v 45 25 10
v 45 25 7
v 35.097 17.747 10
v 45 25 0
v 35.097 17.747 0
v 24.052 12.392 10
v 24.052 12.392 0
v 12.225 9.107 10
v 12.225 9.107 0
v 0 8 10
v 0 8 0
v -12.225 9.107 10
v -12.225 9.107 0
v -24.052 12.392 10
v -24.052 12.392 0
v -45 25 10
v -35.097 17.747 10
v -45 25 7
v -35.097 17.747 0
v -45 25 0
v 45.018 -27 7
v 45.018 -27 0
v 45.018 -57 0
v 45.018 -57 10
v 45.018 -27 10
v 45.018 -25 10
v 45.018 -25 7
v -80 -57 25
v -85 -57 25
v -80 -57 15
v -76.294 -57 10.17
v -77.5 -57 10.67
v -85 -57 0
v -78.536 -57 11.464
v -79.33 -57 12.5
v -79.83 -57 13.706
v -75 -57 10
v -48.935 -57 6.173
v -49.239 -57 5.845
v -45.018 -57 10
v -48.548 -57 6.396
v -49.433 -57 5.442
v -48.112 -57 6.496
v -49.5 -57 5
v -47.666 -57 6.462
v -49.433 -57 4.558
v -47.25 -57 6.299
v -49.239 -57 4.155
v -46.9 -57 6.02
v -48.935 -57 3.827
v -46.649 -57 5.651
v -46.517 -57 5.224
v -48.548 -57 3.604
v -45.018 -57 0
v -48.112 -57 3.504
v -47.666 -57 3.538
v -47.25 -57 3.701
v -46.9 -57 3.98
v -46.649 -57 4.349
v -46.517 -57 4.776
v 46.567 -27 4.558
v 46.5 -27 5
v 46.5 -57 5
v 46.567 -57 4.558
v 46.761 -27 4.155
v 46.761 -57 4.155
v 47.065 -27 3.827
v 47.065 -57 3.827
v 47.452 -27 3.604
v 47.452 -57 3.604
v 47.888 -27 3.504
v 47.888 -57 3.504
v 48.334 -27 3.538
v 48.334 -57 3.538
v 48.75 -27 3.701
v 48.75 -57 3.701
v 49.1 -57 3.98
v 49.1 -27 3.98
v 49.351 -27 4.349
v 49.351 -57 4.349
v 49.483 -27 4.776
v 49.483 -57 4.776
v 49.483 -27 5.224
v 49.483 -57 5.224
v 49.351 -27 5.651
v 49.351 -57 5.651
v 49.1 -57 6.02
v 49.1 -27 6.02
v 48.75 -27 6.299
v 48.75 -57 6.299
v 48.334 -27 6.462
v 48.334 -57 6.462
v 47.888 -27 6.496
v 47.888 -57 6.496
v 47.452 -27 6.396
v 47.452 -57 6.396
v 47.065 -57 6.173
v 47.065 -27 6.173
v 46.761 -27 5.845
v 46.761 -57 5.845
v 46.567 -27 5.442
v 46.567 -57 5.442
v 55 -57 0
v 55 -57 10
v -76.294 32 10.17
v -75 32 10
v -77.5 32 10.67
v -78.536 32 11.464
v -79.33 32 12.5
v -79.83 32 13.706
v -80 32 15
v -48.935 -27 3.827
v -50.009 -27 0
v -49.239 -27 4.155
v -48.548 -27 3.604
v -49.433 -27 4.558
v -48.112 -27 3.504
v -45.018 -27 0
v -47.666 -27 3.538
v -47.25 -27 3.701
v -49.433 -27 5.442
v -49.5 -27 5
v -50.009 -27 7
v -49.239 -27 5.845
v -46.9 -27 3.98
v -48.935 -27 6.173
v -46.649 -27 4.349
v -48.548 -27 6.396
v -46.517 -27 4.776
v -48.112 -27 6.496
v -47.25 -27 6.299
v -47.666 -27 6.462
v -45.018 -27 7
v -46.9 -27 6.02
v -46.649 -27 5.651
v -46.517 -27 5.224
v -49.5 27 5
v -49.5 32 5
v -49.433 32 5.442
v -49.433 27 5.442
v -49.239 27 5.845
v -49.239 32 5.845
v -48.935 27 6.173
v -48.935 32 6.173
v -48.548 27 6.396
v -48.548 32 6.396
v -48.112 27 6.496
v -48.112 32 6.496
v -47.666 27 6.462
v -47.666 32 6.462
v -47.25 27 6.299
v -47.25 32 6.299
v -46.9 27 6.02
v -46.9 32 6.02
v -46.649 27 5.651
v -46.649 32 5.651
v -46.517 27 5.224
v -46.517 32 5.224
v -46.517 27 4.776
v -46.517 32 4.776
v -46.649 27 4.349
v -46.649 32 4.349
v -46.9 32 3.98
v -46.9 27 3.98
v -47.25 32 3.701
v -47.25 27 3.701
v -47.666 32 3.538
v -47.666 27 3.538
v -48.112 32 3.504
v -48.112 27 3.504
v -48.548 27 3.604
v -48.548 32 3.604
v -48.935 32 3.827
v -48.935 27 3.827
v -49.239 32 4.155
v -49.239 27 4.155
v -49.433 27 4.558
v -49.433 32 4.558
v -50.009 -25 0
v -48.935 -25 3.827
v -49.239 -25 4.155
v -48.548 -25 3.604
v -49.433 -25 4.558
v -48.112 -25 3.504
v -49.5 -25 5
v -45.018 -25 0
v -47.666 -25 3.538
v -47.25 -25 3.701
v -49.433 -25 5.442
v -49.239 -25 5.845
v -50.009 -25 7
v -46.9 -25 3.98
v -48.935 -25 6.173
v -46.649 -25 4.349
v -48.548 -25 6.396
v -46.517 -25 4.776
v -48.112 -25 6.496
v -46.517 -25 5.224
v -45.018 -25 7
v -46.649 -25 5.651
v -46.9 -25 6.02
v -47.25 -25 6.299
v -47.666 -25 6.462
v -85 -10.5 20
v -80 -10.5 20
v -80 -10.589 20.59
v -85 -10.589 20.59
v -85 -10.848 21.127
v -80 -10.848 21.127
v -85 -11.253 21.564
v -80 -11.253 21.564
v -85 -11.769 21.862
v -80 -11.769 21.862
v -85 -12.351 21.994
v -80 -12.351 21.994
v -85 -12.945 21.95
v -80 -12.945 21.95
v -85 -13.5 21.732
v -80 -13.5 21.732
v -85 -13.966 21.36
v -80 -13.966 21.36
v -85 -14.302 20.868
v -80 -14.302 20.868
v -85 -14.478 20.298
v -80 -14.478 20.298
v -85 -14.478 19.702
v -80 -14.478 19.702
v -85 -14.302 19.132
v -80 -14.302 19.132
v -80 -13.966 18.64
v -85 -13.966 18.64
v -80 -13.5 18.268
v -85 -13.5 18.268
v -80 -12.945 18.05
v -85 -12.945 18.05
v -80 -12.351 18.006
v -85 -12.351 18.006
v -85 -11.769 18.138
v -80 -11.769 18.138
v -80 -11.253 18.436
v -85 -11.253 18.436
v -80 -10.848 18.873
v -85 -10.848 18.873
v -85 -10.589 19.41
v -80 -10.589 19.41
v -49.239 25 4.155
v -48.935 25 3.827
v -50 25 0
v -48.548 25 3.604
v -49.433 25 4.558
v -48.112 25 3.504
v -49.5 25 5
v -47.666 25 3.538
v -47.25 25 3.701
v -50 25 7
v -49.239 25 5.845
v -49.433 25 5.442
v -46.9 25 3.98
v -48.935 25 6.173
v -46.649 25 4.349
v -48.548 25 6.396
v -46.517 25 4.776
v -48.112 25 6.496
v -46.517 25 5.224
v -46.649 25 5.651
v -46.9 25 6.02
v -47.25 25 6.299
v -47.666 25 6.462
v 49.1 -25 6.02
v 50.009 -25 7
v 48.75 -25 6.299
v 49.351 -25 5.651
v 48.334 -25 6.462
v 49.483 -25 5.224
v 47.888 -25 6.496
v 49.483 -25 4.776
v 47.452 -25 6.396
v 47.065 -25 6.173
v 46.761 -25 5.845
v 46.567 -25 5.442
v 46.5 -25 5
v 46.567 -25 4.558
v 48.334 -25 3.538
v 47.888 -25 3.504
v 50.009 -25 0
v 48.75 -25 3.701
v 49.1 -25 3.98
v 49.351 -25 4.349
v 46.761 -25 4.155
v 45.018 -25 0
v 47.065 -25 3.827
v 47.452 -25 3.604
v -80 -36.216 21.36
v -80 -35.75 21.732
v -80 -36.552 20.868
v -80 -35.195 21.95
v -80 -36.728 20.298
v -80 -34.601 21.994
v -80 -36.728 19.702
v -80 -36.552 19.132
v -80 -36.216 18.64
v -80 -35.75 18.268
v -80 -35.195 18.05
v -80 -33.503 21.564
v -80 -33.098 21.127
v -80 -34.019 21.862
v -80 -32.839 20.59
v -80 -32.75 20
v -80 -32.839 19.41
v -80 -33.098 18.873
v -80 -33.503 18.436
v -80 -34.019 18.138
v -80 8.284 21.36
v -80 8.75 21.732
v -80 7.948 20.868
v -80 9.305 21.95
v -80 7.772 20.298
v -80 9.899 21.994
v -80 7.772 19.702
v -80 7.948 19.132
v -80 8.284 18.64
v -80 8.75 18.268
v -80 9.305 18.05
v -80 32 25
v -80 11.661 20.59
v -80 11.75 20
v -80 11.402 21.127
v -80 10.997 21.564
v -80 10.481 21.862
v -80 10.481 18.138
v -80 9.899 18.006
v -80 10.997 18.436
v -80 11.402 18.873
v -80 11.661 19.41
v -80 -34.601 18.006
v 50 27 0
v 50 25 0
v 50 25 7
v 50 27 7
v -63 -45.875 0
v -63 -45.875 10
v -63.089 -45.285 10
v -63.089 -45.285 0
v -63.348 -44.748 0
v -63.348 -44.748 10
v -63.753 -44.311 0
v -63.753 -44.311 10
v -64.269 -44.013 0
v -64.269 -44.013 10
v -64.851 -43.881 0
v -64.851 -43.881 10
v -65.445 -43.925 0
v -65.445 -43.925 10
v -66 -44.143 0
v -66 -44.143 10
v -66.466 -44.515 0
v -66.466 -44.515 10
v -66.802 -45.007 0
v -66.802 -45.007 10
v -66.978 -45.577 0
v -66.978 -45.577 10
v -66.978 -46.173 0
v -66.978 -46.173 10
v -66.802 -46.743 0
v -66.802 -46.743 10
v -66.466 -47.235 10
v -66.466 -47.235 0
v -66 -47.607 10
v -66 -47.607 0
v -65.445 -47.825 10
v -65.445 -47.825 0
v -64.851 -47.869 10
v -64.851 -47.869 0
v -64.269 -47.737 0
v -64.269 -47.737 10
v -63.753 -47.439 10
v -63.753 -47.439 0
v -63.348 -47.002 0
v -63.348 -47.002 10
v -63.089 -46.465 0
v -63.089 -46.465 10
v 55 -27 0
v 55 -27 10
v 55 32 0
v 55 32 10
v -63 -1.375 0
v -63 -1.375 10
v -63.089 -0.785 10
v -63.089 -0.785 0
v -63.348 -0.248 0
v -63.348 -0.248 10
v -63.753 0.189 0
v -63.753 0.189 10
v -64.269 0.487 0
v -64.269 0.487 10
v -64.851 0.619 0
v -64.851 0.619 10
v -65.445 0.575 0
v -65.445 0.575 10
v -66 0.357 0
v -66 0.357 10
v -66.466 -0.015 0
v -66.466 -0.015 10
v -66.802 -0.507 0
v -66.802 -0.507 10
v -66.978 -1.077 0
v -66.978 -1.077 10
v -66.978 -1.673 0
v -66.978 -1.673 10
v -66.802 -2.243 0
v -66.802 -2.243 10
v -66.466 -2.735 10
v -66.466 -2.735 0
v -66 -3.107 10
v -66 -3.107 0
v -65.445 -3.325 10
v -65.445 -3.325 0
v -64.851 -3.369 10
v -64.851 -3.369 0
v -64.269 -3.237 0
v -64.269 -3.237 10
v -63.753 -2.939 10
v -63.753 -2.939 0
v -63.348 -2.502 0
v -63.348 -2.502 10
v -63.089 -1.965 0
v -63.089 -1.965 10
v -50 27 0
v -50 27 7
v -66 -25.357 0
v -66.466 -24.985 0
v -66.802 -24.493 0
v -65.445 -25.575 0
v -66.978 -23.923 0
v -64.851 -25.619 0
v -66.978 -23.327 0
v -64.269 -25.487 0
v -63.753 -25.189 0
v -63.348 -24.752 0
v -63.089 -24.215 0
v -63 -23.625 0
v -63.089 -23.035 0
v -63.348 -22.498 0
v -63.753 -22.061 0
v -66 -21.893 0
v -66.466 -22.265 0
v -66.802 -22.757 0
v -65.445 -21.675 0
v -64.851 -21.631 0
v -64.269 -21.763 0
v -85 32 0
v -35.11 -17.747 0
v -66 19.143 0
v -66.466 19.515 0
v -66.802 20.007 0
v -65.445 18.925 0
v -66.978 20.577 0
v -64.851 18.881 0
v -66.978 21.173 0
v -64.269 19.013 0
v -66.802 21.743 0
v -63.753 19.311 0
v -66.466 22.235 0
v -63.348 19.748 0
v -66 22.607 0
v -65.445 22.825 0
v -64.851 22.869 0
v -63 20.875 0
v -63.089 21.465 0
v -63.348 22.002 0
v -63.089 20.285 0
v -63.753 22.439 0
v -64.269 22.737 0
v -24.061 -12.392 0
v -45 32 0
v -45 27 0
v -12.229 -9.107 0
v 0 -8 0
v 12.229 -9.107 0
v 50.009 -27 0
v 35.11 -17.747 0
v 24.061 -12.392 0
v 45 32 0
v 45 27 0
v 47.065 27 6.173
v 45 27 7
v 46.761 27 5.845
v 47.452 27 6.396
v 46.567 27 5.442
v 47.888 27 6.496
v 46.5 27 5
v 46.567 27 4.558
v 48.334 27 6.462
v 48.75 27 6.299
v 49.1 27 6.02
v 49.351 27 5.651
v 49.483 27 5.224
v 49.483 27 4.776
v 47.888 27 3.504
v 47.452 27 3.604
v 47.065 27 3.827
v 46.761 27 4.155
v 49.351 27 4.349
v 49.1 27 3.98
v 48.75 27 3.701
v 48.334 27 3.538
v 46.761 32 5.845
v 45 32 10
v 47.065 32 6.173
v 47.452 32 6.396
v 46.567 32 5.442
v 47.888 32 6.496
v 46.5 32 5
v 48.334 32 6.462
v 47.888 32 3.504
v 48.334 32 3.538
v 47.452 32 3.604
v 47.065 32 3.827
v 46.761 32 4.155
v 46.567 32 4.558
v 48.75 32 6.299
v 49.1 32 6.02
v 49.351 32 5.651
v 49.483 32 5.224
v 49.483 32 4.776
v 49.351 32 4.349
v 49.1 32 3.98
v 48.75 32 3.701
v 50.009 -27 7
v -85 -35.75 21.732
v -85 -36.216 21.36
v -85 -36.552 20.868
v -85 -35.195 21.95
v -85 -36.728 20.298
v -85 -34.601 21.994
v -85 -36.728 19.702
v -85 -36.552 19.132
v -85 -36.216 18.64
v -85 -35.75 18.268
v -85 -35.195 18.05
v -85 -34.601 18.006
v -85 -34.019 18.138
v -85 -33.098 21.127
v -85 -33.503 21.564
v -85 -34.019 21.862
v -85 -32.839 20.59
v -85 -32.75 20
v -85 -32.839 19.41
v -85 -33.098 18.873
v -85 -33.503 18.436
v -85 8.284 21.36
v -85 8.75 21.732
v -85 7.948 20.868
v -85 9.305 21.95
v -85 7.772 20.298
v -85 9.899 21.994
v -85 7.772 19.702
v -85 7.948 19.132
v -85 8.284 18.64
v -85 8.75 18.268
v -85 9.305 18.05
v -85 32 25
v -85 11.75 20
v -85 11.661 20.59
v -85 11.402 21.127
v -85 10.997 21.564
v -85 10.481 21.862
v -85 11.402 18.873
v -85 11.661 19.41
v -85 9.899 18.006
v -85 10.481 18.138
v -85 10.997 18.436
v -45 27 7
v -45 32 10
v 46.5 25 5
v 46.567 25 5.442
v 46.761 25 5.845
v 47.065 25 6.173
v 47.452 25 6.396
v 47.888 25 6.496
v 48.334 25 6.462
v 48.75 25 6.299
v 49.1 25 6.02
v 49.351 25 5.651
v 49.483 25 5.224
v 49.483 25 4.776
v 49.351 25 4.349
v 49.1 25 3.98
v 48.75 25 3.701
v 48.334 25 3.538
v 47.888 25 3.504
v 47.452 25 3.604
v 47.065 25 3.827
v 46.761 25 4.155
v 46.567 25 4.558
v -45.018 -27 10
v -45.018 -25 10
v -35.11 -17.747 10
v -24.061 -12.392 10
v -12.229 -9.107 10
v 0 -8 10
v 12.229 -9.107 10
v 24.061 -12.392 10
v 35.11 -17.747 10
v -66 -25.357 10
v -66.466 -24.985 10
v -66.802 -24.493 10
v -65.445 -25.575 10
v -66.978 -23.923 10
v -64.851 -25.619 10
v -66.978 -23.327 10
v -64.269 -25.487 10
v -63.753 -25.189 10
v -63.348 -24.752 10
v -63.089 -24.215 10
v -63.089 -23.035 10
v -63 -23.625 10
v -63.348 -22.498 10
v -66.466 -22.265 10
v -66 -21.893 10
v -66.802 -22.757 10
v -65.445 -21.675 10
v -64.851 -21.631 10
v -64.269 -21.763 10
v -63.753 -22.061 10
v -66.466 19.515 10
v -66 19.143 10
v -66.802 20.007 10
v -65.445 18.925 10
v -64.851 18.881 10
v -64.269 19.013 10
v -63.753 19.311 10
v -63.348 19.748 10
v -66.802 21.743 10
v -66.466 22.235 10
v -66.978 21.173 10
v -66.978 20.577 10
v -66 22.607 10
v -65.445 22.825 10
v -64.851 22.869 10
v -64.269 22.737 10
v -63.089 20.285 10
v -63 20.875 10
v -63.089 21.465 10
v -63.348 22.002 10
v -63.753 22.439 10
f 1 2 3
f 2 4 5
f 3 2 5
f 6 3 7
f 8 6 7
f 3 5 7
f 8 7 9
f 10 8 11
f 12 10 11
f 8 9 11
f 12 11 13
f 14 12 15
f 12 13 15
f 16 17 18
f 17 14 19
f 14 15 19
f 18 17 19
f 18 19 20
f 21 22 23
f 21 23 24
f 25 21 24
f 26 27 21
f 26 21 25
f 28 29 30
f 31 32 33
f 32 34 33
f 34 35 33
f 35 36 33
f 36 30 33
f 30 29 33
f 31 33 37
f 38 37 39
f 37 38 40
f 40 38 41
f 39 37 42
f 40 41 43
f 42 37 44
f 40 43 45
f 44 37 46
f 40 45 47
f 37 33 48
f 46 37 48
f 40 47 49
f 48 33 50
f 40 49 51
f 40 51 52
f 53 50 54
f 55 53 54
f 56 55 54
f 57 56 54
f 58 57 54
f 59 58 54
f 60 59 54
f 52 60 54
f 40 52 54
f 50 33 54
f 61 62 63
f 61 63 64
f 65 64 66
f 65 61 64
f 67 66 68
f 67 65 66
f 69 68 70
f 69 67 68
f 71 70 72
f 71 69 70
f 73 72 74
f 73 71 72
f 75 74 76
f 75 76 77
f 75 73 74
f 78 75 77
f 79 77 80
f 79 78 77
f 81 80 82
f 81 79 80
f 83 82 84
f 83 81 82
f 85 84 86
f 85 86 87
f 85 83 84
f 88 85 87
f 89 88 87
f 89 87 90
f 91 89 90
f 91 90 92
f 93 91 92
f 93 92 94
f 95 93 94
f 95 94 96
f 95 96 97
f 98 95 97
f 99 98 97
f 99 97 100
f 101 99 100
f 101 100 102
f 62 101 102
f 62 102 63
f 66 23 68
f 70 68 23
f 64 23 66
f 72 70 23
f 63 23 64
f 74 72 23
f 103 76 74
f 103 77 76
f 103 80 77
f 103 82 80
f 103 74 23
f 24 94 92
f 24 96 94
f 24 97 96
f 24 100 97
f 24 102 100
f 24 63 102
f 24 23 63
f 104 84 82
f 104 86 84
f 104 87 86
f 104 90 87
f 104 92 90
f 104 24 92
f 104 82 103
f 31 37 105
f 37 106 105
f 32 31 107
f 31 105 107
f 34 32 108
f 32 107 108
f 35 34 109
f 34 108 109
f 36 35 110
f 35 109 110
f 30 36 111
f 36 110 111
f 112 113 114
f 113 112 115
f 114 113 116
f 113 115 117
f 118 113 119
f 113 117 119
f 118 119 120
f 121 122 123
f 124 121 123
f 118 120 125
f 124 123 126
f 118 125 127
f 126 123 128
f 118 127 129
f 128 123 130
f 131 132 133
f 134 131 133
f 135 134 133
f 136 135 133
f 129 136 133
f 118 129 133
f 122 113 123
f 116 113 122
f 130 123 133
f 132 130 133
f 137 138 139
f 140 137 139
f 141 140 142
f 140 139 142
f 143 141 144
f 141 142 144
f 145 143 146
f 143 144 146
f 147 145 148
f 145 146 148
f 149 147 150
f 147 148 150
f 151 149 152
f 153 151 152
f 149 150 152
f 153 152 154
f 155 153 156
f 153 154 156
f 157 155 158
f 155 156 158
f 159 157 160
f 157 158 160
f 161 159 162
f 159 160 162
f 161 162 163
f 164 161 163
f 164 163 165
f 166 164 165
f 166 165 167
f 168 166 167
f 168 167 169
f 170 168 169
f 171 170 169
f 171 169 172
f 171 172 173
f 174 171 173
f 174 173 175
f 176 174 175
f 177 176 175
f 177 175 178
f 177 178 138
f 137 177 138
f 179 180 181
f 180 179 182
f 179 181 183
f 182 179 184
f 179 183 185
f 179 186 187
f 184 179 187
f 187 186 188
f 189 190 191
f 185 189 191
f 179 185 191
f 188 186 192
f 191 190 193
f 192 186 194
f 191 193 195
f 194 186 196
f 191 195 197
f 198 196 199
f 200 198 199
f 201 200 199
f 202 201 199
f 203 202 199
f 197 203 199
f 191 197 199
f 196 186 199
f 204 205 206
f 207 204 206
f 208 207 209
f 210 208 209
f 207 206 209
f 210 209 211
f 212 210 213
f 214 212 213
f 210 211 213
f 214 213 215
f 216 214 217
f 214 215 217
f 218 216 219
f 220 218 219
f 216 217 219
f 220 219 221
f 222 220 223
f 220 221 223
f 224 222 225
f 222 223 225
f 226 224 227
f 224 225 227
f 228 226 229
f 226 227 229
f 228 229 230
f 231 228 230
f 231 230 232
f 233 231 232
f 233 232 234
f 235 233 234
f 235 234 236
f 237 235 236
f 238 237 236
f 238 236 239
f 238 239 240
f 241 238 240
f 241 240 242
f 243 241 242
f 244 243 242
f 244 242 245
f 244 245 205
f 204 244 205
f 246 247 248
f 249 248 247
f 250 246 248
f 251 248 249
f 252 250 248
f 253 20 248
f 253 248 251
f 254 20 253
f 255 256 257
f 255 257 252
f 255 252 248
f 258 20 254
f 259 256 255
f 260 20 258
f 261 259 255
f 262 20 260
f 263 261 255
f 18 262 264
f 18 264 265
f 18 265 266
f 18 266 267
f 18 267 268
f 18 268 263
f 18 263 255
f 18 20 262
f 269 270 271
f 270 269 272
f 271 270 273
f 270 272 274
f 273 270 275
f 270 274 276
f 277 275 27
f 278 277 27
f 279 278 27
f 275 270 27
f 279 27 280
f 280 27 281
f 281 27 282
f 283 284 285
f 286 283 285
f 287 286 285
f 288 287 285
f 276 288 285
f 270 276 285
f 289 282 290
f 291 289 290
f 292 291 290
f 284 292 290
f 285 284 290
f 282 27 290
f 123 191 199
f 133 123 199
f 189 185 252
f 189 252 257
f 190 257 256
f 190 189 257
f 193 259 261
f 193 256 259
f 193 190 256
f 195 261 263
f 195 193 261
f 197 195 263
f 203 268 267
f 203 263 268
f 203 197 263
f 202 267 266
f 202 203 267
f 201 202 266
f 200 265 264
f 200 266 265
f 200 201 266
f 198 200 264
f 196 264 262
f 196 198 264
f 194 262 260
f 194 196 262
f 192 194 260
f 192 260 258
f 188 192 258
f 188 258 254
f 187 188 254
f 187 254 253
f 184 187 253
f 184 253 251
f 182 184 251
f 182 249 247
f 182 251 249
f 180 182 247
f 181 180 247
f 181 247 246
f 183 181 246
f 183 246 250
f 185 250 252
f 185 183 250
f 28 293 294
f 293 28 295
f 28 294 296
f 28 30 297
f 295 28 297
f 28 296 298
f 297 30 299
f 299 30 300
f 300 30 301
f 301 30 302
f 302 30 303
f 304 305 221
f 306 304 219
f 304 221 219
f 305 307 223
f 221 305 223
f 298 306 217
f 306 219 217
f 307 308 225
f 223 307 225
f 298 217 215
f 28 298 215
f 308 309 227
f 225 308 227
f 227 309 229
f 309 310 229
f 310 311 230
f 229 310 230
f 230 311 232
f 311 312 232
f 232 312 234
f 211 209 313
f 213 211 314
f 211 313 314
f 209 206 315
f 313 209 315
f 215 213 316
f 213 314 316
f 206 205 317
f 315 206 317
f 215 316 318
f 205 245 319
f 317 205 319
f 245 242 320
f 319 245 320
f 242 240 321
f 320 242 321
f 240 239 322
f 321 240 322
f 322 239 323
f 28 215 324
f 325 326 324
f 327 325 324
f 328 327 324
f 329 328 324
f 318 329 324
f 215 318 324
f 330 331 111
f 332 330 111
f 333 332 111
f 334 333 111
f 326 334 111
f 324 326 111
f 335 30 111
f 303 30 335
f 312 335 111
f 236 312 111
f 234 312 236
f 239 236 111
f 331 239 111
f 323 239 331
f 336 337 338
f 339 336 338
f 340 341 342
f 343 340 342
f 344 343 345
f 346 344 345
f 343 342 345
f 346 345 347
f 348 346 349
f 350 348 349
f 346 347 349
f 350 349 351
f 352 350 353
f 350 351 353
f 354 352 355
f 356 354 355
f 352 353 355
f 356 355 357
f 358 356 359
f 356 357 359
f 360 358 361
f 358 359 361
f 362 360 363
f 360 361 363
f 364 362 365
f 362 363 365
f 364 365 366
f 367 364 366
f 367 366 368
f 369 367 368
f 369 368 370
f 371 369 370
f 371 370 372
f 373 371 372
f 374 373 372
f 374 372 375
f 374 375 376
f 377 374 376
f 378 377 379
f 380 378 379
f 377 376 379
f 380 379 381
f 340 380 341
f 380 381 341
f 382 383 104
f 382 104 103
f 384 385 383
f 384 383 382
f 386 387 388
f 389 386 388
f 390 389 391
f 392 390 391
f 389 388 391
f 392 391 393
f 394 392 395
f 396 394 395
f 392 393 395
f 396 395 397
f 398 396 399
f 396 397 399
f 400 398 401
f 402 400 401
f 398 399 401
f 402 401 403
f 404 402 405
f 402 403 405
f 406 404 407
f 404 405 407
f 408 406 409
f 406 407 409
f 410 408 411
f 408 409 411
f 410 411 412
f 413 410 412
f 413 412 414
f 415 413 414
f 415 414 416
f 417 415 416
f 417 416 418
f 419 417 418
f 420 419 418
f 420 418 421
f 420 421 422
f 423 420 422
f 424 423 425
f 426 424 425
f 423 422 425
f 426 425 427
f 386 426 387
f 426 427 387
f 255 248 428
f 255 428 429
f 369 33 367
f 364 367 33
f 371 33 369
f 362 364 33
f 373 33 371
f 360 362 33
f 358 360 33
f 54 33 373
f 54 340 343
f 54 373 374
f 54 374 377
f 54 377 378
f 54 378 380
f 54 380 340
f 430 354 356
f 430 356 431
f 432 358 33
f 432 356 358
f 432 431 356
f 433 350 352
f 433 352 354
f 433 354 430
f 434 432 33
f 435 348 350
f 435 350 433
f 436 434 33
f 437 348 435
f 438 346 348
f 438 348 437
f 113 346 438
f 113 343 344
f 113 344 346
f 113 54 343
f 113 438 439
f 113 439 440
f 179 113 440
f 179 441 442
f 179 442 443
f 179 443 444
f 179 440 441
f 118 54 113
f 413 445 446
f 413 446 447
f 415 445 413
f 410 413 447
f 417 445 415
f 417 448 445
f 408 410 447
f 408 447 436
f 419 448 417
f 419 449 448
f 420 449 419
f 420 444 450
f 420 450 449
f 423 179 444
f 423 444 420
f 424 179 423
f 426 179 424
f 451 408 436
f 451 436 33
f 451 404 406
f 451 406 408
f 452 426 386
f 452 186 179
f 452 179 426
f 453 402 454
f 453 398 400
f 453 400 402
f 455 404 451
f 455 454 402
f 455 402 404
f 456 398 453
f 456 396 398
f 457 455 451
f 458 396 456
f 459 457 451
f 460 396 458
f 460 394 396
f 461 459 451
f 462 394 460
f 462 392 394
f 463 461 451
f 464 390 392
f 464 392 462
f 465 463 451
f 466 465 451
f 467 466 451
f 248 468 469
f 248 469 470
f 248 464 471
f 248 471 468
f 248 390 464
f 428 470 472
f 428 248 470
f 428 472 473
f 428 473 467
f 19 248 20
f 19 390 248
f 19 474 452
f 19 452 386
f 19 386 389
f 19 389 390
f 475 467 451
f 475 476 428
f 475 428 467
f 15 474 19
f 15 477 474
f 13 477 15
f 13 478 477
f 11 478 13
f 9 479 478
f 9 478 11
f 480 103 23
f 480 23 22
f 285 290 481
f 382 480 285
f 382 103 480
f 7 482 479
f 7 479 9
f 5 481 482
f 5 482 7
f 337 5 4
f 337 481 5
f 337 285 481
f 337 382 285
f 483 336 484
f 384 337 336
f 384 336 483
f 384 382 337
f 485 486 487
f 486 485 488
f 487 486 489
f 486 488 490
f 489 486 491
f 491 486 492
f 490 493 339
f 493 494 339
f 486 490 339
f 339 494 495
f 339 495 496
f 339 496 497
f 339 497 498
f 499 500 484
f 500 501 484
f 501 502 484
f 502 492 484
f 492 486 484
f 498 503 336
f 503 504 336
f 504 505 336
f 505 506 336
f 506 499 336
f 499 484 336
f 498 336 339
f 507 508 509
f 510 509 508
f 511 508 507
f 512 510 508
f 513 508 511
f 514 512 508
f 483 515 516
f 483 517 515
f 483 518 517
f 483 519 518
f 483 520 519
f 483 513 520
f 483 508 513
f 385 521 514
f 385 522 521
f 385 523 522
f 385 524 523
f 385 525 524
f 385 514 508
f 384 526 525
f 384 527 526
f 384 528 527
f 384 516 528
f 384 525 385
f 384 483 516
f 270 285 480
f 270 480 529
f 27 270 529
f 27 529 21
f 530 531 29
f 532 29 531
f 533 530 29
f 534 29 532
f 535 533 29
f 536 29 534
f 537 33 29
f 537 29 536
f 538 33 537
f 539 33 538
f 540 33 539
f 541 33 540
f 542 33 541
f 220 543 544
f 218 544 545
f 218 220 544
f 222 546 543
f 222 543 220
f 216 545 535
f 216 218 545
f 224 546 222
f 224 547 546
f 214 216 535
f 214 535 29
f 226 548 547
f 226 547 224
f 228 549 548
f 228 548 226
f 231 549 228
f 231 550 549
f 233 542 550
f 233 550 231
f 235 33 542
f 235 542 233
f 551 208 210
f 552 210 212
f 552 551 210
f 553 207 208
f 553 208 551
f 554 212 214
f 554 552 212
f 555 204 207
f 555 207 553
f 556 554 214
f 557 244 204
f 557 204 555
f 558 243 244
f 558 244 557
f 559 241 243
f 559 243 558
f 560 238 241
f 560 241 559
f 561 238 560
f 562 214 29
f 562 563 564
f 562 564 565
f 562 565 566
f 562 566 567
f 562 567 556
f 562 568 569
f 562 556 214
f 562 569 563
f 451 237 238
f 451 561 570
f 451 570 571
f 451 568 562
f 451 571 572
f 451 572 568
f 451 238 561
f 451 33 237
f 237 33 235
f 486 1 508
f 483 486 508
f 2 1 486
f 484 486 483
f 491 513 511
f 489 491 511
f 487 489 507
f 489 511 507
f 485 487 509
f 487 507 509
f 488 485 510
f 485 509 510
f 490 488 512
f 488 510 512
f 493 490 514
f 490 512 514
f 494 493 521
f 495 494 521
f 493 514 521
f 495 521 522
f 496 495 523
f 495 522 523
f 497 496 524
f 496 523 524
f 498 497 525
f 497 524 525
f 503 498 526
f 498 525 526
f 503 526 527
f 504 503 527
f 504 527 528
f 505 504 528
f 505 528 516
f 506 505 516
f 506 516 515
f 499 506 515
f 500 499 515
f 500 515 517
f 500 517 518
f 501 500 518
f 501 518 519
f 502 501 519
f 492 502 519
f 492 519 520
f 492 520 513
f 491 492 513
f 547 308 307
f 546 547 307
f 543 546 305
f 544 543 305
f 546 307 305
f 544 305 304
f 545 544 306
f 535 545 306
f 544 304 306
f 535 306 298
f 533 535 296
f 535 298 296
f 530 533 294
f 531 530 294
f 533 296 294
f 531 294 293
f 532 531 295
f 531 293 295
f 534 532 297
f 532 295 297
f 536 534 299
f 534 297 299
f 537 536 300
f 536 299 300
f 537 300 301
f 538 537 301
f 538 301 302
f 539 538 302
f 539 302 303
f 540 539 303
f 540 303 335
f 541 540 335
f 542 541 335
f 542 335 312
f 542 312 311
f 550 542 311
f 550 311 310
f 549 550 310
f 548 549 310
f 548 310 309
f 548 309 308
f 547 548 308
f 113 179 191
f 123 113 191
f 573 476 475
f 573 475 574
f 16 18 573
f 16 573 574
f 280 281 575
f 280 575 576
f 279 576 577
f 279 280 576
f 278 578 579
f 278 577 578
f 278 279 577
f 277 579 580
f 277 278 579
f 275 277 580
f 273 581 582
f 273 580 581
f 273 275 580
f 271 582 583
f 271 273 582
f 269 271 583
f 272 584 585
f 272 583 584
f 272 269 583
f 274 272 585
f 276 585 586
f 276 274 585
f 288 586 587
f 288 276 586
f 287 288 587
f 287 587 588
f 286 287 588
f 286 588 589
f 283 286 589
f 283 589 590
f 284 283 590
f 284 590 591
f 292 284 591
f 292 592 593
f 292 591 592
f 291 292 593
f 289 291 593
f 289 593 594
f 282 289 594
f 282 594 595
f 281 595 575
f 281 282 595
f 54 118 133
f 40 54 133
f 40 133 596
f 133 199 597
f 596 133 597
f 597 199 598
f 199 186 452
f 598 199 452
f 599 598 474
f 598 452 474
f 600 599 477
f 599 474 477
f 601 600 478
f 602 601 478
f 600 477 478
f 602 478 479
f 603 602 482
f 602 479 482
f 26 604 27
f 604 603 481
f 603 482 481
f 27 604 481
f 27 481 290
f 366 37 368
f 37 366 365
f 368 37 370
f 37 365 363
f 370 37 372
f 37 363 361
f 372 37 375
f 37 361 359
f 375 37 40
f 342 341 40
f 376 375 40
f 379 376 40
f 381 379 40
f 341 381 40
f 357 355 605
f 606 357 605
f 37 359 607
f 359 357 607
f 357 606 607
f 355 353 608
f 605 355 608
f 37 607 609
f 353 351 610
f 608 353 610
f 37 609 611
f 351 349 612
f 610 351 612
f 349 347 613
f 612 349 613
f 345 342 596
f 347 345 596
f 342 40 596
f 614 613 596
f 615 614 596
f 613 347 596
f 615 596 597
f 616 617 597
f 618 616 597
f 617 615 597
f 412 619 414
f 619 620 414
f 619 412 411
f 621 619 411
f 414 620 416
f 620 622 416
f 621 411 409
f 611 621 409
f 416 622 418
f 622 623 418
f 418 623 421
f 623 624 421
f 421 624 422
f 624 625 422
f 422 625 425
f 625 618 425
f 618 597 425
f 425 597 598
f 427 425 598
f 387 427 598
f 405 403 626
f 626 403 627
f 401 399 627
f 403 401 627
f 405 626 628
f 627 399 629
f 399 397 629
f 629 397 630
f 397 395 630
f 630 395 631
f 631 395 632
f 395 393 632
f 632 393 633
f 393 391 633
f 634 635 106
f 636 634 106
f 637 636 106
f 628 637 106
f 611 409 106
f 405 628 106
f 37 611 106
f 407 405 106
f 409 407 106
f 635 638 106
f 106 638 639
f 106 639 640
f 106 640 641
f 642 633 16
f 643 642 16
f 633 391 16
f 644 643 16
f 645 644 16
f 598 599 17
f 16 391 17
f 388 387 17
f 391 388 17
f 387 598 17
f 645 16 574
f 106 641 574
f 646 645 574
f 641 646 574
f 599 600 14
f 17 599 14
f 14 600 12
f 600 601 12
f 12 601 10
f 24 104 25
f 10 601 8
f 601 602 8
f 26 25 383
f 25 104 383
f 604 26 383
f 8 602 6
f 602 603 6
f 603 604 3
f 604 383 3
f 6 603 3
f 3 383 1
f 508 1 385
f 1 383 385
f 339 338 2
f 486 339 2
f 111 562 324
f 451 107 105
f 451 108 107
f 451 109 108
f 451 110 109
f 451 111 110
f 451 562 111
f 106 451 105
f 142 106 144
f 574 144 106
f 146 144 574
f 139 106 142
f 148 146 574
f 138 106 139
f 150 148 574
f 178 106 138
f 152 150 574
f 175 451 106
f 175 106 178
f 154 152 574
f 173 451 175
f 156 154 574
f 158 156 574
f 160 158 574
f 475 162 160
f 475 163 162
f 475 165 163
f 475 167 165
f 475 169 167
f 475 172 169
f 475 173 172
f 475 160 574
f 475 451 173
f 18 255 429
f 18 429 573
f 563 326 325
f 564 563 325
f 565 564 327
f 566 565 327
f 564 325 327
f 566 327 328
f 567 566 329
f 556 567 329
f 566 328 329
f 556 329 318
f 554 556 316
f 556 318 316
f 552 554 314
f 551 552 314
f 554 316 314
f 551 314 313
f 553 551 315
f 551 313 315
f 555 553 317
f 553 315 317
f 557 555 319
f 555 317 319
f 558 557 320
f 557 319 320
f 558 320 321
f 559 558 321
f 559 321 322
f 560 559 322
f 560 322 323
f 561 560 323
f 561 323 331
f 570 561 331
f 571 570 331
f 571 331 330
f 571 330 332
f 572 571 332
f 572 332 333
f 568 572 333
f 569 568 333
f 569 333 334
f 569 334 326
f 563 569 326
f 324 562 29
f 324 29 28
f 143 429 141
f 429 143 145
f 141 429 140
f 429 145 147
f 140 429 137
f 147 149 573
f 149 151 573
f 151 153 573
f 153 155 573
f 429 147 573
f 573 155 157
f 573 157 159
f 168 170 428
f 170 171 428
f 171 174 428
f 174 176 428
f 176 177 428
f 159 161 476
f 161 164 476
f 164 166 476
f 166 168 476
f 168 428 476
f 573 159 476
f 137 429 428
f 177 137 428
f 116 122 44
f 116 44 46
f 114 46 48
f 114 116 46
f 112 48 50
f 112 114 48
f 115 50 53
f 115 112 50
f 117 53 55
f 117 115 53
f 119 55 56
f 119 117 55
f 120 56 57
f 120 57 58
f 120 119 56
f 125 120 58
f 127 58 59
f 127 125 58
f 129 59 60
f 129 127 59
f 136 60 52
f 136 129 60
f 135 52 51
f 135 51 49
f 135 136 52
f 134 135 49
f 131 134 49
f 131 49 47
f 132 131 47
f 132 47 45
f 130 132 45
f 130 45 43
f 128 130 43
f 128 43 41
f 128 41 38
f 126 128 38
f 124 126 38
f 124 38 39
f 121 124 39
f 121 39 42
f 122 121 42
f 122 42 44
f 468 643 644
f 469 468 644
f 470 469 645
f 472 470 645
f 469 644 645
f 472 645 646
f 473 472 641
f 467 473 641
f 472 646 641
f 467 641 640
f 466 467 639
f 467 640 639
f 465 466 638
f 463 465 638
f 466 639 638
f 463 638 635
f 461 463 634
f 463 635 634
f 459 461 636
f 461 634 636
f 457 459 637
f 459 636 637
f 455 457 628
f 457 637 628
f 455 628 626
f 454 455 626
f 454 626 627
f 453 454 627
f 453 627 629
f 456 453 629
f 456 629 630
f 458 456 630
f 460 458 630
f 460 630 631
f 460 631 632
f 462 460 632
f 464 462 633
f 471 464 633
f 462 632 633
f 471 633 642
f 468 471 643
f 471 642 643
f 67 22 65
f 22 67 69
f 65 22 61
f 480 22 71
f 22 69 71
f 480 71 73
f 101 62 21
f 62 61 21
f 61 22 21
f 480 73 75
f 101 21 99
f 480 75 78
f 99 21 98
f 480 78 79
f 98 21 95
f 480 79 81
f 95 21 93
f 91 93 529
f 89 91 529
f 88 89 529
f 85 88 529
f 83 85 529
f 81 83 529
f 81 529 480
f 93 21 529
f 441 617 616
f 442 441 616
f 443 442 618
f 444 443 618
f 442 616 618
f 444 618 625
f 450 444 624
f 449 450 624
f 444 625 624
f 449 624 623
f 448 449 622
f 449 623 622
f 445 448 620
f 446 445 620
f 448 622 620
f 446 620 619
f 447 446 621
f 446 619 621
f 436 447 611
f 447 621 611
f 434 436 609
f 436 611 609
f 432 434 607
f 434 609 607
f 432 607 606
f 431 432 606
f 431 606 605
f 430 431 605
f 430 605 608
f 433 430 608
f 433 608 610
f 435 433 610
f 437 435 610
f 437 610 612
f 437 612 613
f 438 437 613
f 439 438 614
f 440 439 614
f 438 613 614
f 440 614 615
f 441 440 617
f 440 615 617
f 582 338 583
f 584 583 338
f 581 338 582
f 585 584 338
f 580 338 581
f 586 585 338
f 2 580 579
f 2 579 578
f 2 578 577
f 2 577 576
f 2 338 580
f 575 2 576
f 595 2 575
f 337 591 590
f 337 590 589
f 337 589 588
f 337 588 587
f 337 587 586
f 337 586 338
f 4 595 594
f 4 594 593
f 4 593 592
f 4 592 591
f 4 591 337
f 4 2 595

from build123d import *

# Parameters (mm, degrees)
BOSS_EXTRUDE1_DEPTH     = 10
CUT_EXTRUDE1_DEPTH      = 72.414284285
CUT_EXTRUDE1_DEPTH_BACK = 72.414284285
SKETCH2_R               = 1.5
SKETCH9_W               = 10
SKETCH9_H               = 50
BOSS_EXTRUDE9_DEPTH     = 5
SKETCH10_W              = 10
SKETCH10_H              = 50
BOSS_EXTRUDE10_DEPTH    = 5
BOSS_EXTRUDE11_DEPTH    = 2
SKETCH12_W              = 10
SKETCH12_H              = 10
BOSS_EXTRUDE12_DEPTH    = 5
CUT_EXTRUDE2_START      = 7
SKETCH13_R              = 1.5
CUT_EXTRUDE2_DEPTH      = 7
BOSS_EXTRUDE13_DEPTH    = 2
SKETCH15_W              = 9.981523119
SKETCH15_H              = 10
BOSS_EXTRUDE14_DEPTH    = 30
SKETCH16_R              = 1.5
CUT_EXTRUDE3_DEPTH      = 32
SKETCH17_W              = 10
SKETCH17_H              = 89
BOSS_EXTRUDE15_DEPTH    = 30
SKETCH19_W              = 5
SKETCH19_H              = 89
BOSS_EXTRUDE16_DEPTH    = 15
FILLET1_R               = 5
SKETCH20_R              = 2
CUT_EXTRUDE4_DEPTH      = 149.657324071
SKETCH21_R              = 2
CUT_EXTRUDE5_DEPTH      = 10


with BuildPart() as part:
    # Sketch1 → Boss-Extrude1 (new body)
    with BuildSketch(Plane.XY):
        with BuildLine():
            Line((45.018476881, -25), (50, -25))
            Line((50, -25), (50, 25))
            Line((50, 25), (45, 25))
            ThreePointArc((45, 25), (0, 8), (-45, 25))
            Line((-45, 25), (-50, 25))
            Line((-50, 25), (-50, -25))
            Line((-50, -25), (-45.018476881, -25))
            ThreePointArc((-45.018476881, -25), (0, -8), (45.018476881, -25))
        make_face()
    extrude(amount=BOSS_EXTRUDE1_DEPTH)

    # Sketch2 → Cut-Extrude1 (cut, two sides: drawn at the far end of the back side and taken through both)
    with BuildSketch(Plane(origin=(0, 25, 0), x_dir=(1, 0, 0), z_dir=(0, 1, 0)).offset(-CUT_EXTRUDE1_DEPTH_BACK)):
        with Locations(Location((-48, -5, 0), (0, 0, 180))):
            Circle(SKETCH2_R)
        with Locations(Location((48, -5, 0), (0, 0, 180))):
            Circle(SKETCH2_R)
    extrude(amount=CUT_EXTRUDE1_DEPTH + CUT_EXTRUDE1_DEPTH_BACK, mode=Mode.SUBTRACT)

    # Sketch9 → Boss-Extrude9 (add)
    with BuildSketch(Plane(origin=(50, 0, 0), x_dir=(0, 0, -1), z_dir=(1, 0, 0))):
        with Locations((-5, 0)):
            Rectangle(SKETCH9_W, SKETCH9_H)
    extrude(amount=BOSS_EXTRUDE9_DEPTH)

    # Sketch10 → Boss-Extrude10 (add)
    with BuildSketch(Plane.ZY.offset(50)):
        with Locations((5, 0)):
            Rectangle(SKETCH10_W, SKETCH10_H)
    extrude(amount=BOSS_EXTRUDE10_DEPTH)

    # Sketch11 → Boss-Extrude11 (add)
    with BuildSketch(Plane(origin=(0, 25, 0), x_dir=(1, 0, 0), z_dir=(0, 1, 0))):
        Polygon((50, 0), (50, -7), (45, -7), (45, -10), (55, -10), (55, 0), align=None)
        Polygon((-50, 0), (-50, -7), (-45, -7), (-45, -10), (-55, -10), (-55, 0), align=None)
    extrude(amount=BOSS_EXTRUDE11_DEPTH)

    # Sketch12 → Boss-Extrude12 (add)
    with BuildSketch(Plane(origin=(0, 27, 0), x_dir=(1, 0, 0), z_dir=(0, 1, 0))):
        with Locations((50, -5)):
            Rectangle(SKETCH12_W, SKETCH12_H)
        with Locations((-50, -5)):
            Rectangle(SKETCH12_W, SKETCH12_H)
    extrude(amount=BOSS_EXTRUDE12_DEPTH)

    # Sketch13 → Cut-Extrude2 (cut)
    with BuildSketch(Plane(origin=(0, 25, 0), x_dir=(1, 0, 0), z_dir=(0, 1, 0)).offset(CUT_EXTRUDE2_START)):
        with Locations(Location((48, -5, 0), (0, 0, 180))):
            Circle(SKETCH13_R)
        with Locations(Location((-48, -5, 0), (0, 0, 180))):
            Circle(SKETCH13_R)
    extrude(amount=-CUT_EXTRUDE2_DEPTH, mode=Mode.SUBTRACT)

    # Sketch14 → Boss-Extrude13 (add)
    with BuildSketch(Plane.XZ.offset(25)):
        Polygon((50.009238441, 0), (50.009238441, 7), (45.018476881, 7), (45.018476881, 10), (55, 10), (55, 0), align=None)
        Polygon((-50.009238441, 0), (-50.009238441, 7), (-45.018476881, 7), (-45.018476881, 10), (-55, 10), (-55, 0), align=None)
    extrude(amount=BOSS_EXTRUDE13_DEPTH)

    # Sketch15 → Boss-Extrude14 (add)
    with BuildSketch(Plane.XZ.offset(27)):
        with Locations((-50.00923844, 5)):
            Rectangle(SKETCH15_W, SKETCH15_H)
        with Locations((50.00923844, 5)):
            Rectangle(SKETCH15_W, SKETCH15_H)
    extrude(amount=BOSS_EXTRUDE14_DEPTH)

    # Sketch16 → Cut-Extrude3 (cut)
    with BuildSketch(Plane.XZ.offset(25)):
        with Locations(Location((48, 5, 0), (0, 0, 180))):
            Circle(SKETCH16_R)
        with Locations(Location((-48, 5, 0), (0, 0, 180))):
            Circle(SKETCH16_R)
    extrude(amount=CUT_EXTRUDE3_DEPTH, mode=Mode.SUBTRACT)

    # Sketch17 → Boss-Extrude15 (add)
    with BuildSketch(Plane.ZY.offset(55)):
        with Locations((5, -12.5)):
            Rectangle(SKETCH17_W, SKETCH17_H)
    extrude(amount=BOSS_EXTRUDE15_DEPTH)

    # Sketch19 → Boss-Extrude16 (add)
    with BuildSketch(Plane.XY.offset(10)):
        with Locations((-82.5, -12.5)):
            Rectangle(SKETCH19_W, SKETCH19_H)
    extrude(amount=BOSS_EXTRUDE16_DEPTH)

    # Fillet1
    fillet1_edges = [part.edges().sort_by_distance(p)[0] for p in [
        (-80, -12.5, 10),
    ]]
    fillet(fillet1_edges, radius=FILLET1_R)

    # Sketch20 → Cut-Extrude4 (cut, through all)
    with BuildSketch(Plane(origin=(-80, 0, 0), x_dir=(0, 0, -1), z_dir=(1, 0, 0))):
        with Locations(Location((-20, 9.75, 0), (0, 0, 90))):
            Circle(SKETCH20_R)
        with Locations(Location((-20, -12.5, 0), (0, 0, 90))):
            Circle(SKETCH20_R)
        with Locations(Location((-20, -34.75, 0), (0, 0, 90))):
            Circle(SKETCH20_R)
    extrude(amount=-CUT_EXTRUDE4_DEPTH, mode=Mode.SUBTRACT)

    # Sketch21 → Cut-Extrude5 (cut)
    with BuildSketch(Plane.XY.offset(10)):
        with Locations((-65, 20.875)):
            Circle(SKETCH21_R)
        with Locations((-65, -1.375)):
            Circle(SKETCH21_R)
        with Locations((-65, -23.625)):
            Circle(SKETCH21_R)
        with Locations((-65, -45.875)):
            Circle(SKETCH21_R)
    extrude(amount=-CUT_EXTRUDE5_DEPTH, mode=Mode.SUBTRACT)


solid = part.part
